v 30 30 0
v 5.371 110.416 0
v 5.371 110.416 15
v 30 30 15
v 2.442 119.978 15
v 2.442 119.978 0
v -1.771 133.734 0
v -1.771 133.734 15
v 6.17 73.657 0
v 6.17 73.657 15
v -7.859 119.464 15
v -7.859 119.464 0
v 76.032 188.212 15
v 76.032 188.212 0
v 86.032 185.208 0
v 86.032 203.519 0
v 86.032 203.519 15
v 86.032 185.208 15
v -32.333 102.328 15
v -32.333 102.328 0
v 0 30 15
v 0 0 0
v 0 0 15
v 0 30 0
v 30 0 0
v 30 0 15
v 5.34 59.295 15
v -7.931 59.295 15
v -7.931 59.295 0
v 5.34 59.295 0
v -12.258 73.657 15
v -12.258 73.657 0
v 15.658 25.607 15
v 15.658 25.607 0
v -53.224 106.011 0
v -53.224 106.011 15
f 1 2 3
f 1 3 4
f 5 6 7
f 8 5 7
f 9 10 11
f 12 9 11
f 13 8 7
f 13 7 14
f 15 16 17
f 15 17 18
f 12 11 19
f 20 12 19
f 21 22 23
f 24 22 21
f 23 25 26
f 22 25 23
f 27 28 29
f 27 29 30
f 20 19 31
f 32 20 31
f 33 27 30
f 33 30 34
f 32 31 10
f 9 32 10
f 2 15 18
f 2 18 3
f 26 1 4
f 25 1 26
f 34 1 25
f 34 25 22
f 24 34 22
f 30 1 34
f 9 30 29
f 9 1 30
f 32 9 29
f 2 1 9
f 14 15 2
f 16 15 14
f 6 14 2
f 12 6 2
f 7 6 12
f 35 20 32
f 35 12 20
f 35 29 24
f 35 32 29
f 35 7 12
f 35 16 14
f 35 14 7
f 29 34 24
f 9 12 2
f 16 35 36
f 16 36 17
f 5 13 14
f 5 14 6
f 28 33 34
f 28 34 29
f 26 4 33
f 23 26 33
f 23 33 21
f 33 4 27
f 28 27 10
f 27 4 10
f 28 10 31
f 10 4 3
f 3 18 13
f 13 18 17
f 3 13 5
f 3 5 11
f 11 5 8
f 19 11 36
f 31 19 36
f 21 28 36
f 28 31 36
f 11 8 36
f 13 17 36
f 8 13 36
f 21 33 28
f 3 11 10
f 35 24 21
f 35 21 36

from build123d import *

# Parameters (mm, degrees)
PAD_DEPTH       = 15
POCKET_DEPTH    = 15.001
POCKET001_DEPTH = 15.001
POCKET002_DEPTH = 15.001


with BuildPart() as part:
    # Sketch → Pad (new body)
    with BuildSketch(Plane.XY):
        Polygon((86.032137, 203.51933), (86.032137, 185.207711), (5.370759, 110.416387), (30, 30), (30, 0), (0, 0), (0, 30), (-53.22371, 106.011336), align=None)
    extrude(amount=PAD_DEPTH)

    # Sketch001 (on Face10 of Pad) → Pocket (cut, through all)
    with BuildSketch(Plane.XY.offset(15)):
        Polygon((-32.332783, 102.327701), (-12.257608, 73.65738), (6.170493, 73.65738), (-7.858915, 119.464488), align=None)
    extrude(amount=-POCKET_DEPTH, mode=Mode.SUBTRACT)

    # Sketch002 (on Face5 of Pocket) → Pocket001 (cut, through all)
    with BuildSketch(Plane.XY.offset(15)):
        Polygon((-1.770811, 133.734171), (76.032137, 188.212382), (2.442314, 119.977988), align=None)
    extrude(amount=-POCKET001_DEPTH, mode=Mode.SUBTRACT)

    # Sketch003 (on Face5 of Pocket001) → Pocket002 (cut, through all)
    with BuildSketch(Plane.XY.offset(15)):
        Polygon((-7.930737, 59.294992), (5.340032, 59.294992), (15.657585, 25.607376), align=None)
    extrude(amount=-POCKET002_DEPTH, mode=Mode.SUBTRACT)


solid = part.part
